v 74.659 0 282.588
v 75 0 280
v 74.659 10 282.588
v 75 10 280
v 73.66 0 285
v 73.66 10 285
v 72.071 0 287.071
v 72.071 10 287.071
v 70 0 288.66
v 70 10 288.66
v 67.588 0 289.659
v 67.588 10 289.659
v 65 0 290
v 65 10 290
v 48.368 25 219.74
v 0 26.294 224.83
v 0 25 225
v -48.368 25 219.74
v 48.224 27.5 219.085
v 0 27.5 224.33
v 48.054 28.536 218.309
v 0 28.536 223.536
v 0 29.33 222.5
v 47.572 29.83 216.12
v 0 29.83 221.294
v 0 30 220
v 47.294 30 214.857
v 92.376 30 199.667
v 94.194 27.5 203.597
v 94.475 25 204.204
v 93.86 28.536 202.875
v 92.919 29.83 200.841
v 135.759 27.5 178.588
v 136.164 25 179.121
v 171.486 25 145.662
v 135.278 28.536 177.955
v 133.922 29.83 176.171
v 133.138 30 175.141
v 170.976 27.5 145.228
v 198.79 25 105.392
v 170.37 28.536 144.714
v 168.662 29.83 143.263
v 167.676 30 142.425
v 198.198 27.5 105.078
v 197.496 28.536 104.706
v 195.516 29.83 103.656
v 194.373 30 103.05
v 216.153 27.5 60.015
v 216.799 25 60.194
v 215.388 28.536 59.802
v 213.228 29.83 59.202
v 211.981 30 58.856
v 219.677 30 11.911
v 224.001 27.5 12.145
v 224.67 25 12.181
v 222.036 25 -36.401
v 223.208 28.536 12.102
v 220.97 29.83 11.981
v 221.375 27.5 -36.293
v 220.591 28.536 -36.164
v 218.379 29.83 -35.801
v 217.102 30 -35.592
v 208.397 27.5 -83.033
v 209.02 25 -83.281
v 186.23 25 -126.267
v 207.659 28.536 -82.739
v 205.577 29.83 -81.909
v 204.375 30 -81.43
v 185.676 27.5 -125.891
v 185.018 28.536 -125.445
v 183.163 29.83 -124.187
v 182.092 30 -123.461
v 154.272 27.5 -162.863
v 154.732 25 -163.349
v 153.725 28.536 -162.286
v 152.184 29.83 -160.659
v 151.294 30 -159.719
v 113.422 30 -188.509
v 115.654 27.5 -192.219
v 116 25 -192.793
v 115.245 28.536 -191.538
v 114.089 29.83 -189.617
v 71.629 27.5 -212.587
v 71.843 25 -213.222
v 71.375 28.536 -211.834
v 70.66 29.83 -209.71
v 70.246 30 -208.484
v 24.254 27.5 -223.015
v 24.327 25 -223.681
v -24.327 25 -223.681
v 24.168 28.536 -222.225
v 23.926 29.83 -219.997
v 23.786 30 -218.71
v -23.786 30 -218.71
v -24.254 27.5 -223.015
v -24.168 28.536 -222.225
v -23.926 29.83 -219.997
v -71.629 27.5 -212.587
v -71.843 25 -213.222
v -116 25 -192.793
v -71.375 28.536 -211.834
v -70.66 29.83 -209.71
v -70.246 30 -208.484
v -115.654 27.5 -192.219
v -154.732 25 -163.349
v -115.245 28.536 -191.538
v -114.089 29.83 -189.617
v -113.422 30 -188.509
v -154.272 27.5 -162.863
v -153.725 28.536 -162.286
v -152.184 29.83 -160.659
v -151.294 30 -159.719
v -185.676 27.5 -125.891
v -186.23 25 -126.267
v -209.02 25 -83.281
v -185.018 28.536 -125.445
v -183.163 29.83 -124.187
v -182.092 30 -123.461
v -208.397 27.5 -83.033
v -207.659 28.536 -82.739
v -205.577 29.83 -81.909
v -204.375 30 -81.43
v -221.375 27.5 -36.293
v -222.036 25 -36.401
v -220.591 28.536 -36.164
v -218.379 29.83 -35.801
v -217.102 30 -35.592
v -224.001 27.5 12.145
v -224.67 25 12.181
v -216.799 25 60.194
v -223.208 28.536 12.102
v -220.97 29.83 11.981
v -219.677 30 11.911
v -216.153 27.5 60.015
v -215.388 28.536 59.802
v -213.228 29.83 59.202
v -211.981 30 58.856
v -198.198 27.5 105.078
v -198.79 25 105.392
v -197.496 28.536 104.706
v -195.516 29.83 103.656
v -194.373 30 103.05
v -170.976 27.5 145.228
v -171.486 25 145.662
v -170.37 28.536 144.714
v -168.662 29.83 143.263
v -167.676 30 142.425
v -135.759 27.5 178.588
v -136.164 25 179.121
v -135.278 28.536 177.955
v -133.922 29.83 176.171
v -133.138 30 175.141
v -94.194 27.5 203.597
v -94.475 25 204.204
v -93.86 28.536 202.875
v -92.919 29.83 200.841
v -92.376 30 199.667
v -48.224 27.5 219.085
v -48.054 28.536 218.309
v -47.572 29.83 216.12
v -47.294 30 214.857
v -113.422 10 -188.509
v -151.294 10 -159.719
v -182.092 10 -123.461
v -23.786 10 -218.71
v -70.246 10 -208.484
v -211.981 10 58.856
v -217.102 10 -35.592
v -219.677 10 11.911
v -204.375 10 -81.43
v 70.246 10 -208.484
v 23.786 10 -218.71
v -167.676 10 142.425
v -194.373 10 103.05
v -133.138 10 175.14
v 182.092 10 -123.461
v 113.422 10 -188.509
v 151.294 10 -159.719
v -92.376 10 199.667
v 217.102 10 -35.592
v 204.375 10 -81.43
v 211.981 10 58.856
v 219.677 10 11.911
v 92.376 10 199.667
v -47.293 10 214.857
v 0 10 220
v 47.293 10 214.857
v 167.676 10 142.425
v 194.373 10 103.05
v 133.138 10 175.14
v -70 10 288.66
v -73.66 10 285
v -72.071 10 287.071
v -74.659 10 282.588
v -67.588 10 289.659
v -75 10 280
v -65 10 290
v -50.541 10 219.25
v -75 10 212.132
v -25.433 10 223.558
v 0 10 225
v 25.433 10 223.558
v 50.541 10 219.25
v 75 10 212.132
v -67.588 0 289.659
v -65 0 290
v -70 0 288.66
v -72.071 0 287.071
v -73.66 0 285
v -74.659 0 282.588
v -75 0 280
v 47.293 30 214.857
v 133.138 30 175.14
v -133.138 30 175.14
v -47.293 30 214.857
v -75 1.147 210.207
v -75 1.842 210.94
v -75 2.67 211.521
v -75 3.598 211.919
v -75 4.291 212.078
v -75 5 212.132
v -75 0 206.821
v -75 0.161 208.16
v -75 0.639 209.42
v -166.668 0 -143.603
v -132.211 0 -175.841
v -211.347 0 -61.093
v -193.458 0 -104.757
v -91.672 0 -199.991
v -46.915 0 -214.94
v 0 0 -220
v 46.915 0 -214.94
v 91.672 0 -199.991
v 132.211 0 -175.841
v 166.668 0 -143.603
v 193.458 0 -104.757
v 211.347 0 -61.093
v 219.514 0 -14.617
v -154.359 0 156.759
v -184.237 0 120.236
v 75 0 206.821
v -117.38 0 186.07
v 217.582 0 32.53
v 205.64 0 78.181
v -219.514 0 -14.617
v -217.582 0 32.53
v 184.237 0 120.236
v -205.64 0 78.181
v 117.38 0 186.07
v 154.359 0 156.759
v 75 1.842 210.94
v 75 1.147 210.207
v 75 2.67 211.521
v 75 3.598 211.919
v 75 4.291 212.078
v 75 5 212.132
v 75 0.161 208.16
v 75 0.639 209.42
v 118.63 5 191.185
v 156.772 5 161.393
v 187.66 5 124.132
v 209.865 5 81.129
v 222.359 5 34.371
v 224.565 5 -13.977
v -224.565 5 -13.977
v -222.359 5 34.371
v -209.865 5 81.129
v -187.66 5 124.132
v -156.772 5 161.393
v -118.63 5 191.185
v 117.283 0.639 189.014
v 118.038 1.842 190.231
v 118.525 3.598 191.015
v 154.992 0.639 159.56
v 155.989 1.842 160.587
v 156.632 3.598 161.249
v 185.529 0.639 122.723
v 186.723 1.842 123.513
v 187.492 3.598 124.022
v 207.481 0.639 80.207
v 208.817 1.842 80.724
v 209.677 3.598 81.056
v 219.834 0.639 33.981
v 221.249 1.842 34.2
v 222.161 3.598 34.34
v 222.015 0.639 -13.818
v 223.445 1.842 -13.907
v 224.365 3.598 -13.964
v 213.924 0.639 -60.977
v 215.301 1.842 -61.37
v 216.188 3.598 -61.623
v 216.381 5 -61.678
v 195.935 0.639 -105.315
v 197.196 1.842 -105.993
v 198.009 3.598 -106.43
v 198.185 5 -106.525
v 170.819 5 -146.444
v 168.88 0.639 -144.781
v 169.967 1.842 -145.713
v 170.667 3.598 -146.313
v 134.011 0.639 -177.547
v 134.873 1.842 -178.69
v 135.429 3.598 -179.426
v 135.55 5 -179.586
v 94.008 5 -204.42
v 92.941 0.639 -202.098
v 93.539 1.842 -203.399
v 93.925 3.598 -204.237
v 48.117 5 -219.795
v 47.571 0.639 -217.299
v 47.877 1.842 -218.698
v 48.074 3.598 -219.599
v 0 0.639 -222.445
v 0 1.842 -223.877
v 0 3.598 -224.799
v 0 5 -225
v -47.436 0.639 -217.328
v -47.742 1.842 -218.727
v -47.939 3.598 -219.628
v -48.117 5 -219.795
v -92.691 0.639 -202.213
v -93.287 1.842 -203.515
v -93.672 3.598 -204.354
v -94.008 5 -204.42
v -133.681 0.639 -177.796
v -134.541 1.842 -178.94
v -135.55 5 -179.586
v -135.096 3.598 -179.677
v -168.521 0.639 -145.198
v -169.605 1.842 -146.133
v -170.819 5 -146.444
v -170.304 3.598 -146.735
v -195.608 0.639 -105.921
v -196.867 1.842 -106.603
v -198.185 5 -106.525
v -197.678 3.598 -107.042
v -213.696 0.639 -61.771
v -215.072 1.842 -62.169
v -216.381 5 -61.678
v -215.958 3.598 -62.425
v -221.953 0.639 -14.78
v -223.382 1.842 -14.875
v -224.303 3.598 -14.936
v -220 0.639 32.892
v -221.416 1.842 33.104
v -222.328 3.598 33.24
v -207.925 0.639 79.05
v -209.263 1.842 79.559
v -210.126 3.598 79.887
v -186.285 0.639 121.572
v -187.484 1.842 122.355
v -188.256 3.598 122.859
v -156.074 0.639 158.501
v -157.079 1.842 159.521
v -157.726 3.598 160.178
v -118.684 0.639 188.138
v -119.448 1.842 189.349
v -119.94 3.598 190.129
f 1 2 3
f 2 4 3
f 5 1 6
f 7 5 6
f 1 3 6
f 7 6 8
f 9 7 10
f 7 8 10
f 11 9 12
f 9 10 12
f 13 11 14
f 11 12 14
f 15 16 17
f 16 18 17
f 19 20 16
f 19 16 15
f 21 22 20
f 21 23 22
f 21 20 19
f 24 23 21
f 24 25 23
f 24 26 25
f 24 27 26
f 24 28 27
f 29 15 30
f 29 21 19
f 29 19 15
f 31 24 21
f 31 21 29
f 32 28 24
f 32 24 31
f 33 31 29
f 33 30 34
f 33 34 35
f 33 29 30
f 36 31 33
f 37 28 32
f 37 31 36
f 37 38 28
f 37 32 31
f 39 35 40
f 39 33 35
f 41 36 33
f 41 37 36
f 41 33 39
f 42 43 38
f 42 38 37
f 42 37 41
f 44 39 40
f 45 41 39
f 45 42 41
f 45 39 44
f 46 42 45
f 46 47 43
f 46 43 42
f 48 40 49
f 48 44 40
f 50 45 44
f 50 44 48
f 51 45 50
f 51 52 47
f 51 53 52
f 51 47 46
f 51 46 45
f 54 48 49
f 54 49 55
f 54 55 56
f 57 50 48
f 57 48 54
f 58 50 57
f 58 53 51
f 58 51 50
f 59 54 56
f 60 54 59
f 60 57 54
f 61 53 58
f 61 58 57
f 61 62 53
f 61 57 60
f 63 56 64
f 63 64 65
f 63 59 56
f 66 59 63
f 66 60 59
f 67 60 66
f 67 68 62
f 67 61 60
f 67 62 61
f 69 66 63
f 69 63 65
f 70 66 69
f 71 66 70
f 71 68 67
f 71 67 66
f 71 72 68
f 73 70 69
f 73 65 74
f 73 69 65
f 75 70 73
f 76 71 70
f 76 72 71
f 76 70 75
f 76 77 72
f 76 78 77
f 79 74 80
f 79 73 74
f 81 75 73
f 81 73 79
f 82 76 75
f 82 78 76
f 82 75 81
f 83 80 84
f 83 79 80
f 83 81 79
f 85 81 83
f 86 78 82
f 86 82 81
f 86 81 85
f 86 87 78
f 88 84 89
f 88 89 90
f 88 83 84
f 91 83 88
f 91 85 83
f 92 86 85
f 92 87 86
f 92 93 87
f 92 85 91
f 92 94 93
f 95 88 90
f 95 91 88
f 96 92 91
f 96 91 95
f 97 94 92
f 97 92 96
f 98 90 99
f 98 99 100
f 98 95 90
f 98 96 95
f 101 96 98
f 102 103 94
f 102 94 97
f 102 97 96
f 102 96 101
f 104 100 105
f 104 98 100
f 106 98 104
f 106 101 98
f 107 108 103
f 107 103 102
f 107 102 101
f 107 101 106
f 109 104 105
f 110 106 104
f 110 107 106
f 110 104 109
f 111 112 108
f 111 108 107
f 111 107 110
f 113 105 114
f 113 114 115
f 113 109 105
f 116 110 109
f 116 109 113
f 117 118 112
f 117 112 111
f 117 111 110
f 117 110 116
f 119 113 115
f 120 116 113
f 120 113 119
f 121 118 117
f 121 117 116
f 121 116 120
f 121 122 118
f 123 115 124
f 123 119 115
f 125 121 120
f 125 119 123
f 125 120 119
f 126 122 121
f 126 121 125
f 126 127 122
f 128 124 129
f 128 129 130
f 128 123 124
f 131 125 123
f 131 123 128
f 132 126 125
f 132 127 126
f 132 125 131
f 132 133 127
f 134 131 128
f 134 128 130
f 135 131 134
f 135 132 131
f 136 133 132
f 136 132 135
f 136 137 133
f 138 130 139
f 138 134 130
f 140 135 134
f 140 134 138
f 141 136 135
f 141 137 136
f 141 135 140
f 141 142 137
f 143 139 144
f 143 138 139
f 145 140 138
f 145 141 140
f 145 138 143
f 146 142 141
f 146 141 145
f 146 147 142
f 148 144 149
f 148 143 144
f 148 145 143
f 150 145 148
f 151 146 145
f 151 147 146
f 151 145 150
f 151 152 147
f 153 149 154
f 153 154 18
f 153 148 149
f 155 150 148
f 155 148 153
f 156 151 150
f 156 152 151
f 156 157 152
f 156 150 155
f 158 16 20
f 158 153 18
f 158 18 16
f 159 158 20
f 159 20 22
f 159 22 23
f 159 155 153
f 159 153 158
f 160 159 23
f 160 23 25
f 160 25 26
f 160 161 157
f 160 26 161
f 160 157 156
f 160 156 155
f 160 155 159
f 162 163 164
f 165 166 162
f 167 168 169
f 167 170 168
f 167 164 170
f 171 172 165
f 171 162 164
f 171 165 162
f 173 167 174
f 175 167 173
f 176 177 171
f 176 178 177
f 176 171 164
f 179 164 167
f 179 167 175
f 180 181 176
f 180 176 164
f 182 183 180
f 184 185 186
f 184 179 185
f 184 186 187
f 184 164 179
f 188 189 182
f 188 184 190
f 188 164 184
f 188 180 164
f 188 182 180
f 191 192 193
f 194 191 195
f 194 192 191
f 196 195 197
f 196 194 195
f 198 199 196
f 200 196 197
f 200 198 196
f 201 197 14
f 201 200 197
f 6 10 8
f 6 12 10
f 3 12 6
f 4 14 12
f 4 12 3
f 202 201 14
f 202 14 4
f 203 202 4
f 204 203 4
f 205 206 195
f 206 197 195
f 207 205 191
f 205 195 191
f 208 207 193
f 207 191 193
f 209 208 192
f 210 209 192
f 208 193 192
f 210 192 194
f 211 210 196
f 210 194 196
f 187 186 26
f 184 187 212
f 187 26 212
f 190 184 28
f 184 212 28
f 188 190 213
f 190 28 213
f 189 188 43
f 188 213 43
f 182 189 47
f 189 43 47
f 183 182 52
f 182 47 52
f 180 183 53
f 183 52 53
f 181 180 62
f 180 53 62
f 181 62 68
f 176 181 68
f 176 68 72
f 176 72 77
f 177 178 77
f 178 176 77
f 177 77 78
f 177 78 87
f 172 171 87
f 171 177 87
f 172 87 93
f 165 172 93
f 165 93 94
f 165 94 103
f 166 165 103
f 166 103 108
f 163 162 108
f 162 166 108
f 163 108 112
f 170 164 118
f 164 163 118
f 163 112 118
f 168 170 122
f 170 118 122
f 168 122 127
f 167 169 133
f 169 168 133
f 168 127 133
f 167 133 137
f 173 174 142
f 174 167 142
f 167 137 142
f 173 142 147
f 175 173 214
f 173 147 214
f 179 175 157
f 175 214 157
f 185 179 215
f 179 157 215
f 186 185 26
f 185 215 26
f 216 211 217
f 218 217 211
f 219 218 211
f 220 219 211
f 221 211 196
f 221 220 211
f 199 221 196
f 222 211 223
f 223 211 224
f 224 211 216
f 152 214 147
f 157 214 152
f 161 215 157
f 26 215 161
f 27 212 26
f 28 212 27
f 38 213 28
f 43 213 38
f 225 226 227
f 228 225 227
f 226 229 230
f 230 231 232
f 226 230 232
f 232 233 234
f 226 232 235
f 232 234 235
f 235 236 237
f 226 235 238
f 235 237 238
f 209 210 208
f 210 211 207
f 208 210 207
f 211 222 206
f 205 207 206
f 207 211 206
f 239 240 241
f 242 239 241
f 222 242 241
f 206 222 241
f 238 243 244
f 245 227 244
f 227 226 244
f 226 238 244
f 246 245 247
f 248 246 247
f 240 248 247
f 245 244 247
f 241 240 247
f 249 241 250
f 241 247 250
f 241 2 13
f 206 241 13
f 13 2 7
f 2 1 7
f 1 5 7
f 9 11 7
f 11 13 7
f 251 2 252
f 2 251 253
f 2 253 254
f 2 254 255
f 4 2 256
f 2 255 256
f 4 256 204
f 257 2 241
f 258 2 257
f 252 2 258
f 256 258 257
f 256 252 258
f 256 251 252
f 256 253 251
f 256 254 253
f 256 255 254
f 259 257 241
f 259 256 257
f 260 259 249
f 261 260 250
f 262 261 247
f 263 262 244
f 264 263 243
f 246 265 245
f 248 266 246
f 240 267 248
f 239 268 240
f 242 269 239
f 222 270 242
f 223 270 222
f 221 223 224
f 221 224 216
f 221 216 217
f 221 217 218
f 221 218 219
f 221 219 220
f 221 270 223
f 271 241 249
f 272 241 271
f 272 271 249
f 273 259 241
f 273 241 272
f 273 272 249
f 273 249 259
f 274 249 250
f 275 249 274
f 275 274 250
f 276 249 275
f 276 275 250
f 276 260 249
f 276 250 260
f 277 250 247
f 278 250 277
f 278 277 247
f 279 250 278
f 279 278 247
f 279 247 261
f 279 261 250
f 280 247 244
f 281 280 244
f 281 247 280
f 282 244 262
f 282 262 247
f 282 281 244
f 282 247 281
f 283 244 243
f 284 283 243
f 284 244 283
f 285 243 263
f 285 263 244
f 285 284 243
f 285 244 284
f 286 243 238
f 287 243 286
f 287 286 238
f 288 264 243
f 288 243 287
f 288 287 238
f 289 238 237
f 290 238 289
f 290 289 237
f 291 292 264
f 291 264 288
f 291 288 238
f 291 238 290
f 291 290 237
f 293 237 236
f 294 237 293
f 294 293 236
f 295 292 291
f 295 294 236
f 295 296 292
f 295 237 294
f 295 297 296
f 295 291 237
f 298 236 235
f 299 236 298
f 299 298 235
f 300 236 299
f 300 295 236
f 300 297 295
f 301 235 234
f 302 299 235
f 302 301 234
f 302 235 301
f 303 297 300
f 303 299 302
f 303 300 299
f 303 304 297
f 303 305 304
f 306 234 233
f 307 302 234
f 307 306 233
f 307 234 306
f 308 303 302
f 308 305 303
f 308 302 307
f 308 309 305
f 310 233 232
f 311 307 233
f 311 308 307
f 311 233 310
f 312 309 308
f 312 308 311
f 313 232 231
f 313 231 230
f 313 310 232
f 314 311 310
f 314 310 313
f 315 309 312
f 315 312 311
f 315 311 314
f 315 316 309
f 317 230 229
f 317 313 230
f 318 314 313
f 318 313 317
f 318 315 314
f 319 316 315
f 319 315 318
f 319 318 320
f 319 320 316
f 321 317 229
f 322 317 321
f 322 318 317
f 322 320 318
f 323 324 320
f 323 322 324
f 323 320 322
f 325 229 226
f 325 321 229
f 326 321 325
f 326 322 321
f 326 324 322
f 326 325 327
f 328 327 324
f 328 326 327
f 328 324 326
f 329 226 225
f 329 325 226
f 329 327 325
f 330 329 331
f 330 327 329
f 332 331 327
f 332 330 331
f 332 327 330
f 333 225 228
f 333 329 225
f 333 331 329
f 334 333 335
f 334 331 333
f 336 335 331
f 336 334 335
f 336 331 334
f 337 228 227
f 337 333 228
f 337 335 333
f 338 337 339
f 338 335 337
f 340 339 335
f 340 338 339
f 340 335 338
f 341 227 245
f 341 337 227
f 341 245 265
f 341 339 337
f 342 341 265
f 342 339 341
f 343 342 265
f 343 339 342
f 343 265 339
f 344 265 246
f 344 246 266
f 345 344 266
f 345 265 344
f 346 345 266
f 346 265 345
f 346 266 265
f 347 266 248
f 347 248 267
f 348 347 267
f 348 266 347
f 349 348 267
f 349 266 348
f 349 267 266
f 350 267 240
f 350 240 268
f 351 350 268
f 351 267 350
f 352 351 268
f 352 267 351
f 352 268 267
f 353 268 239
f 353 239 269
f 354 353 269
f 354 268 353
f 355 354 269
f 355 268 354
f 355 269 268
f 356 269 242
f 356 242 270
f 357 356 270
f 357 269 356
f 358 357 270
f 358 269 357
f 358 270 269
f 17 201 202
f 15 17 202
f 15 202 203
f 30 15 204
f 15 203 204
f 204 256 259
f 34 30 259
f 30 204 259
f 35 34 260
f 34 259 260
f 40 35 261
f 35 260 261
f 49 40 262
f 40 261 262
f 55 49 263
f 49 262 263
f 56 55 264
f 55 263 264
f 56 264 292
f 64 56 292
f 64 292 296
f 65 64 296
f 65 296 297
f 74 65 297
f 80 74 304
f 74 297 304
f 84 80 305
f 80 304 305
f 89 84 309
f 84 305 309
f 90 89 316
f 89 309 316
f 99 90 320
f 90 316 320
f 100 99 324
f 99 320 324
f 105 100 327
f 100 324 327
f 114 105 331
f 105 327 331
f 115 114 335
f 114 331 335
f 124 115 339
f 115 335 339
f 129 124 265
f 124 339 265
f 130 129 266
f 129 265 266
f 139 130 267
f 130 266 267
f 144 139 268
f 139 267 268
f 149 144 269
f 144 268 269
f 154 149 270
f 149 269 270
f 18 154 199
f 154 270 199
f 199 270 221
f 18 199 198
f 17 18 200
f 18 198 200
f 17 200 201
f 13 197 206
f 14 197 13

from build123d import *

# Parameters (mm, degrees)
SKETCH1_R           = 225
BOSS_EXTRUDE1_DEPTH = 30
SKETCH2_R           = 220
CUT_EXTRUDE1_DEPTH  = 20
SKETCH4_W           = 150
SKETCH4_H           = 10
BOSS_EXTRUDE3_DEPTH = 290
FILLET1_R           = 10
FILLET2_R           = 5


with BuildPart() as part:
    # Sketch1 → Boss-Extrude1 (new body)
    with BuildSketch(Plane(origin=(0, 0, 0), x_dir=(1, 0, 0), z_dir=(0, 1, 0))):
        with Locations(Location((0, 0, 0), (0, 0, 270))):
            Circle(SKETCH1_R)
    extrude(amount=BOSS_EXTRUDE1_DEPTH)

    # Sketch2 → Cut-Extrude1 (cut)
    with BuildSketch(Plane(origin=(0, 30, 0), x_dir=(1, 0, 0), z_dir=(0, 1, 0))):
        with Locations(Location((0, 0, 0), (0, 0, 270))):
            Circle(SKETCH2_R)
    extrude(amount=-CUT_EXTRUDE1_DEPTH, mode=Mode.SUBTRACT)

    # Sketch4 → Boss-Extrude3 (add)
    with BuildSketch(Plane.XY):
        with Locations((0, 5)):
            Rectangle(SKETCH4_W, SKETCH4_H)
    extrude(amount=BOSS_EXTRUDE3_DEPTH)

    # Fillet1
    fillet1_edges = [part.edges().sort_by_distance(p)[0] for p in [
        (75, 5, 290),
        (-75, 5, 290),
    ]]
    fillet(fillet1_edges, radius=FILLET1_R)

    # Fillet2
    fillet2_edges = [part.edges().sort_by_distance(p)[0] for p in [
        (0, 0, -225),
        (0, 30, -225),
    ]]
    fillet(fillet2_edges, radius=FILLET2_R - 0.0001)  # a hair under: the kernel refuses the full size


solid = part.part
